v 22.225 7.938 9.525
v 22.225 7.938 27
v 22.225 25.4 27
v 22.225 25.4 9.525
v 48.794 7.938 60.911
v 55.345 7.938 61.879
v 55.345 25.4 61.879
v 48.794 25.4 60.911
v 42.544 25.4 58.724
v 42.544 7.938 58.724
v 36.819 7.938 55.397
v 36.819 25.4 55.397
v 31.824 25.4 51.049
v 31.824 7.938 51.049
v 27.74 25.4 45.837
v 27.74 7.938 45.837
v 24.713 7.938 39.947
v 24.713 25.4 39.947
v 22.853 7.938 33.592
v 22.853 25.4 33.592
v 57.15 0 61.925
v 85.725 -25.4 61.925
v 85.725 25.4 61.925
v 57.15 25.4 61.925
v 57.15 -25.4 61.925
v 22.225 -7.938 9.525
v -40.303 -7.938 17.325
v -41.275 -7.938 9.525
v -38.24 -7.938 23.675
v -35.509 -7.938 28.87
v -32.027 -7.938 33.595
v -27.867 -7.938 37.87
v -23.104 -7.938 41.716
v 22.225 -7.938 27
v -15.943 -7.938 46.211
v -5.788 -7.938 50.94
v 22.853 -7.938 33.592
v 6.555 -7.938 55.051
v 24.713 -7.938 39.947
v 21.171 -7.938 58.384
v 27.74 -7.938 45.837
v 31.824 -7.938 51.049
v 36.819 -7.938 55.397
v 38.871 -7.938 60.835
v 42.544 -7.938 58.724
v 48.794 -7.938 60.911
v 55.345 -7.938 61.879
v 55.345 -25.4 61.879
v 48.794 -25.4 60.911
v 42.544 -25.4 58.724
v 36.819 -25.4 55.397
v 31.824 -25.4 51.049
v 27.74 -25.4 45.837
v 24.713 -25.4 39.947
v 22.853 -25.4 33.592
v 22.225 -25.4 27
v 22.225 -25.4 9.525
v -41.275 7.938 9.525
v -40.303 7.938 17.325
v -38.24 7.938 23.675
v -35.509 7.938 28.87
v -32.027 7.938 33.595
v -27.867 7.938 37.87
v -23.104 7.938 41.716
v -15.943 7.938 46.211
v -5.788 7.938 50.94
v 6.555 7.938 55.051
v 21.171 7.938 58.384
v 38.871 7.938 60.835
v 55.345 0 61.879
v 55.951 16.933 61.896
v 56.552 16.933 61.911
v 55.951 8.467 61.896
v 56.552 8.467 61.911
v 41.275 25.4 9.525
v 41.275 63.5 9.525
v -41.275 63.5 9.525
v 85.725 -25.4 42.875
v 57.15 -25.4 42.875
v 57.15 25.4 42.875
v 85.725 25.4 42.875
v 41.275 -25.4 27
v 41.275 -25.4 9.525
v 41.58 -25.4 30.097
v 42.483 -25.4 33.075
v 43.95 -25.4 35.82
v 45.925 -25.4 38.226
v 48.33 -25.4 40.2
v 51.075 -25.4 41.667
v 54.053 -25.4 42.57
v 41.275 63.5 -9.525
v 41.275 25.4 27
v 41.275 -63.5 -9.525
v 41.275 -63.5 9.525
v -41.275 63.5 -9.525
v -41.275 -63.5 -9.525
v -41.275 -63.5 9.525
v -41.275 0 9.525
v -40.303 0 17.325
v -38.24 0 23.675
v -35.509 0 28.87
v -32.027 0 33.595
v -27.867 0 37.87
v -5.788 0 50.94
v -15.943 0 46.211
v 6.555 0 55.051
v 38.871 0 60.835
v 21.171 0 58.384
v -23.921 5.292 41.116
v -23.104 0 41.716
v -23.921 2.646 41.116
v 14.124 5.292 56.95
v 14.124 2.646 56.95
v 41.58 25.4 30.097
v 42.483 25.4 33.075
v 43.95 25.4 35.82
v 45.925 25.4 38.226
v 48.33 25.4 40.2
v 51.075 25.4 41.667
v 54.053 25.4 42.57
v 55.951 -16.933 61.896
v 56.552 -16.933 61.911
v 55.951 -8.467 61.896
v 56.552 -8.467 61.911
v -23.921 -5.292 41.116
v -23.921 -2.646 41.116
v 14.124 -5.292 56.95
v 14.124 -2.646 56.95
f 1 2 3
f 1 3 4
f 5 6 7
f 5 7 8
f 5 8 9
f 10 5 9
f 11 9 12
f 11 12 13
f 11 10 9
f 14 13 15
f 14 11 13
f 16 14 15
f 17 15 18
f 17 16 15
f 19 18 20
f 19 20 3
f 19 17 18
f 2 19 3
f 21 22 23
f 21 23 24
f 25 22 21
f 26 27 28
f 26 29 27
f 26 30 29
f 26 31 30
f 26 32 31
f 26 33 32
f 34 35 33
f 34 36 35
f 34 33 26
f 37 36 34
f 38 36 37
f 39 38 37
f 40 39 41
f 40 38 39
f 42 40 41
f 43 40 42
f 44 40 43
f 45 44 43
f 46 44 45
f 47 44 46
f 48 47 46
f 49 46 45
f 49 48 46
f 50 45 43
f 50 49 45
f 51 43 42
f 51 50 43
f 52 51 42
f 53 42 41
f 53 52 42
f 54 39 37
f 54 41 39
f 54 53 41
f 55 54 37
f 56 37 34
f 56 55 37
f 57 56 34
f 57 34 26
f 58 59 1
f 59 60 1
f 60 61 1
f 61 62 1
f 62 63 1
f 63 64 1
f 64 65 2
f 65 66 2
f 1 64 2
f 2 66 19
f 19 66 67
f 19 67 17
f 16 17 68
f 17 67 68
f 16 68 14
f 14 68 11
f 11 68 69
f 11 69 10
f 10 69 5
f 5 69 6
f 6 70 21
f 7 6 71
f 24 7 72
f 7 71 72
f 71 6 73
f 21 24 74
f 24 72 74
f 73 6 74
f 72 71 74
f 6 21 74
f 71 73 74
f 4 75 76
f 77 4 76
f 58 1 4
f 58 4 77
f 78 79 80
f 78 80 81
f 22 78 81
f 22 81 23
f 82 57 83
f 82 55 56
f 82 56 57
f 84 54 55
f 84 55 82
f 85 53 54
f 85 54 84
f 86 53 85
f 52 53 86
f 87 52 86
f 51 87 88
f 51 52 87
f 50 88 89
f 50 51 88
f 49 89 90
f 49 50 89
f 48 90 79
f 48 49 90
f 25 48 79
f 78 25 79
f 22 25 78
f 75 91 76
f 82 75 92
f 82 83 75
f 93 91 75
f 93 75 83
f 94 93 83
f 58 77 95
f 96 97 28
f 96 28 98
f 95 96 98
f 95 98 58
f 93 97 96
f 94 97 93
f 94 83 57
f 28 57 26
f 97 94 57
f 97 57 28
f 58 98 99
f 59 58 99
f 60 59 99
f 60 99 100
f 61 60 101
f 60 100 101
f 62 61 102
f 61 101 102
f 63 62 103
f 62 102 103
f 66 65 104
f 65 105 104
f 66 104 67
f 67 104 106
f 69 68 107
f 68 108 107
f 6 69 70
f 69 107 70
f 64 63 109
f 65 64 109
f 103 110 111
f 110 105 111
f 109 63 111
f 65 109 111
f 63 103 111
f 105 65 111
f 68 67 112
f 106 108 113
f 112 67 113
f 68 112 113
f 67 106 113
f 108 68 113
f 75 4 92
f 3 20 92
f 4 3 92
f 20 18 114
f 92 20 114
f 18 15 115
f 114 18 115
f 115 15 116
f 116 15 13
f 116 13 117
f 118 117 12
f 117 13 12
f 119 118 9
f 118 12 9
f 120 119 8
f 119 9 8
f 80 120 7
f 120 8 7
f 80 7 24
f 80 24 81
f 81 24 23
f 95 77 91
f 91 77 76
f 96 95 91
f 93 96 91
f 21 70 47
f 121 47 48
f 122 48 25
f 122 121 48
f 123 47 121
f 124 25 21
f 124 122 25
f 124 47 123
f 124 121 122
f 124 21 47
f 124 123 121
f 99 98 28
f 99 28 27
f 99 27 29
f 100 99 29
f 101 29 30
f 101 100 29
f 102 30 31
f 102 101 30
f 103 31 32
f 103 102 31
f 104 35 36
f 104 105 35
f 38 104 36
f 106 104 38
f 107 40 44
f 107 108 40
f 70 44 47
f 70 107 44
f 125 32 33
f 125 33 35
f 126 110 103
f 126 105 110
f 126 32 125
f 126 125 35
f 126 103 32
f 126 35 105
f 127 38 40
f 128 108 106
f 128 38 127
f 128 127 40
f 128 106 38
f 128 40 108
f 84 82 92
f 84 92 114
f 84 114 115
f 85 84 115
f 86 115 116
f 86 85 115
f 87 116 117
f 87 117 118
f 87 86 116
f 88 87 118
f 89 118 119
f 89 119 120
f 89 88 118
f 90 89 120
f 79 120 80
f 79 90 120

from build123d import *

# Parameters (mm, degrees)
F1_DEPTH = 63.5
F0_W     = 25.4
F0_H     = 19.05
F2_DEPTH = 25.4
F3_DEPTH = 7.9375


with BuildPart() as f1:
    # F0 (on Front) → F1 (new body, symmetric)
    with BuildSketch(Plane.XZ):
        Polygon((41.275, -9.525), (41.275, 9.525), (22.225, 9.525), (-41.275, 9.525), (-41.275, -9.525), align=None)
    extrude(amount=F1_DEPTH, both=True)

    # F0 (on Front) → F2 (join, symmetric)
    with BuildSketch(Plane.XZ):
        with BuildLine():
            Line((22.225, 9.525), (41.275, 9.525))
            Line((41.275, 9.525), (41.275, 27.0002))
            ThreePointArc((41.275, 27.0002), (45.9246798487, 38.2255201513), (57.15, 42.8752))
            Line((57.15, 42.8752), (60.325, 42.8752))
            Line((60.325, 42.8752), (60.325, 61.9252))
            Line((60.325, 61.9252), (57.15, 61.9252))
            add(Edge.make_bspline(
                [(55.3448990391, 61.8785204229), (55.9525265065, 61.8965004125), (56.5543434747, 61.9120279552), (57.15, 61.9252)],
                knots=[109.7015046992, 109.7015046992, 109.7015046992, 109.7015046992, 111.5045361635, 111.5045361635, 111.5045361635, 111.5045361635], degree=3))
            ThreePointArc((55.3448990391, 61.8785204229), (31.8241359865, 51.0492381714), (22.225, 27.0002))
            Line((22.225, 27.0002), (22.225, 9.525))
        make_face()
        with Locations((73.025, 52.4002)):
            Rectangle(F0_W, F0_H)
    extrude(amount=F2_DEPTH, both=True)

    # F0 (on Front) → F3 (join, symmetric)
    with BuildSketch(Plane.XZ):
        with BuildLine():
            Line((-41.275, 9.525), (22.225, 9.525))
            Line((22.225, 9.525), (22.225, 27.0002))
            ThreePointArc((22.225, 27.0002), (31.8241359865, 51.0492381714), (55.3448990391, 61.8785204229))
            add(Edge.make_bspline(
                [(-41.275, 9.525), (-40.1042120828, 50.6120289683), (18.3751351779, 60.7845672918), (55.3448990391, 61.8785204229)],
                knots=[0, 0, 0, 0, 109.7015046992, 109.7015046992, 109.7015046992, 109.7015046992], degree=3))
        make_face()
    extrude(amount=F3_DEPTH, both=True)


solid = f1.part
